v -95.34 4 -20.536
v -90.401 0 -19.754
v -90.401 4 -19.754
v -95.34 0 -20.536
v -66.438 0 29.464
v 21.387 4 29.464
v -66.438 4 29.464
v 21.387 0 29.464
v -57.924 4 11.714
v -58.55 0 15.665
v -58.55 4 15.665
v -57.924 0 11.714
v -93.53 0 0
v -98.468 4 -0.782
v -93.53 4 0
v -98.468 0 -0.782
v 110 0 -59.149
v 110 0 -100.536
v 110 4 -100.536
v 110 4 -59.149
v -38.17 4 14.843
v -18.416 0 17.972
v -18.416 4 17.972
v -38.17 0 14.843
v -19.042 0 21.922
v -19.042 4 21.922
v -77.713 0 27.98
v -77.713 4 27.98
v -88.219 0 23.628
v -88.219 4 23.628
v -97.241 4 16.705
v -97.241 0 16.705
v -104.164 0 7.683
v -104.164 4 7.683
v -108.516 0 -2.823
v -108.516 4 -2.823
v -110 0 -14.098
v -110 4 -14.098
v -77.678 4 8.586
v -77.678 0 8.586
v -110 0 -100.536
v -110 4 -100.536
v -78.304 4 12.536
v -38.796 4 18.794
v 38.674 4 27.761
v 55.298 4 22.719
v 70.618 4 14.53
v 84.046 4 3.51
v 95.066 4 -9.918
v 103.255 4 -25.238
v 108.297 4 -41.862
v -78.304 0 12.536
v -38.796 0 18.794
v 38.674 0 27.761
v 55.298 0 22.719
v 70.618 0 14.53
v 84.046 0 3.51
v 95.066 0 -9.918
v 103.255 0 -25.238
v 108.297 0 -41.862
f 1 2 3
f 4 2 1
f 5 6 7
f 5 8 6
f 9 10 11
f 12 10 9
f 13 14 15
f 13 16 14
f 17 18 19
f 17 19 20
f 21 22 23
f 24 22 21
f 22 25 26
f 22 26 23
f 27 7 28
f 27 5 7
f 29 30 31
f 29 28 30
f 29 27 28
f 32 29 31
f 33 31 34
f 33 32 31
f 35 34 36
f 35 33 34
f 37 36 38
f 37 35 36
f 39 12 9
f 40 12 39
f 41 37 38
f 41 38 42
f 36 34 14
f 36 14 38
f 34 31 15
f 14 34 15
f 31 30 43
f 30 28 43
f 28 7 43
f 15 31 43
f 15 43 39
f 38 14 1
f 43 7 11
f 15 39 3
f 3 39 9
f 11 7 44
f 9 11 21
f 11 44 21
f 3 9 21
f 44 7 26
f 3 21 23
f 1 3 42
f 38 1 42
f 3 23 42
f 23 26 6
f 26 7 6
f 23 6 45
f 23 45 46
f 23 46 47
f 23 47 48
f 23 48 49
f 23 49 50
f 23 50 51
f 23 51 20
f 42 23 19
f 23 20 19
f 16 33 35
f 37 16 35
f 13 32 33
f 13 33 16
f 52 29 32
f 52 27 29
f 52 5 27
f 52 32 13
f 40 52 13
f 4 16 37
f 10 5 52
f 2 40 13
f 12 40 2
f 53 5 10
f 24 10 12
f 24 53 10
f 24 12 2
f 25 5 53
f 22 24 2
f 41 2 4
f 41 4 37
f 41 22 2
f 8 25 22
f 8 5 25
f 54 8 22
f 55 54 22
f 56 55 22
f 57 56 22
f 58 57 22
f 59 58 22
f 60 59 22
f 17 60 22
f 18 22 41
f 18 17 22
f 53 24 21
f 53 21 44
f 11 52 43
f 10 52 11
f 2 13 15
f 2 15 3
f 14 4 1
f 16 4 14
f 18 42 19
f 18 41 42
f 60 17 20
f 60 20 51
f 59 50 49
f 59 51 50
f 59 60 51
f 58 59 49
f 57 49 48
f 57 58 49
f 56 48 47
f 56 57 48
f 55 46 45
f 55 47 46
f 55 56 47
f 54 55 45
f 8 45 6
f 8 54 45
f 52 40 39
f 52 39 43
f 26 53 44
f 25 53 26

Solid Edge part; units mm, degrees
sketch "Sketch1" plane through (0, 0, 0) normal (0, -1, 0) x (1, 0, 0)
  line L0 (21.3868, 29.4641) -> (-66.4383, 29.4641)
  arc A0 (-110, -14.0976) -> (-66.4383, 29.4641) centre (-66.4383, -14.0976) cw
  line L1 (-110, -14.0976) -> (-110, -100.5359)
  line L2 (-110, -100.5359) -> (110, -100.5359)
  line L3 (110, -100.5359) -> (110, -59.1492)
  arc A1 (21.3868, 29.4641) -> (110, -59.1492) centre (21.3868, -59.1492) cw
  line L4 (-78.3036, 12.5363) -> (-58.5498, 15.665)
  line L5 (-58.5498, 15.665) -> (-57.9241, 11.7142)
  line L6 (-57.9241, 11.7142) -> (-77.6778, 8.5855)
  line L7 (-77.6778, 8.5855) -> (-78.3036, 12.5363)
  line L8 (-38.796, 18.7936) -> (-19.0423, 21.9223)
  line L9 (-19.0423, 21.9223) -> (-18.4165, 17.9716)
  line L10 (-18.4165, 17.9716) -> (-38.1703, 14.8429)
  line L11 (-38.1703, 14.8429) -> (-38.796, 18.7936)
  line L12 (-98.4684, -0.7822) -> (-93.5299, 0)
  line L13 (-93.5299, 0) -> (-90.4012, -19.7538)
  line L14 (-90.4012, -19.7538) -> (-95.3397, -20.5359)
  line L15 (-95.3397, -20.5359) -> (-98.4684, -0.7822)
  dimension "D1" = 20
  dimension "D2" = 20
  dimension "D3" = 4
  dimension "D4" = 4
  dimension "D5" = 4
  dimension "D6" = 20
  dimension "D7" = 17
  dimension "D8" = 130
  dimension "D9" = 220
  dimension "D10" = 87.8251
  dimension "D11" = 19.7538
  dimension "D12" = 4.9384
  dimension "D13" = 80
  dimension "D14" = 6
  dimension "D15" = 14.6603
extrude "Protrusion1" add sketch "Sketch1" against normal blind 4
